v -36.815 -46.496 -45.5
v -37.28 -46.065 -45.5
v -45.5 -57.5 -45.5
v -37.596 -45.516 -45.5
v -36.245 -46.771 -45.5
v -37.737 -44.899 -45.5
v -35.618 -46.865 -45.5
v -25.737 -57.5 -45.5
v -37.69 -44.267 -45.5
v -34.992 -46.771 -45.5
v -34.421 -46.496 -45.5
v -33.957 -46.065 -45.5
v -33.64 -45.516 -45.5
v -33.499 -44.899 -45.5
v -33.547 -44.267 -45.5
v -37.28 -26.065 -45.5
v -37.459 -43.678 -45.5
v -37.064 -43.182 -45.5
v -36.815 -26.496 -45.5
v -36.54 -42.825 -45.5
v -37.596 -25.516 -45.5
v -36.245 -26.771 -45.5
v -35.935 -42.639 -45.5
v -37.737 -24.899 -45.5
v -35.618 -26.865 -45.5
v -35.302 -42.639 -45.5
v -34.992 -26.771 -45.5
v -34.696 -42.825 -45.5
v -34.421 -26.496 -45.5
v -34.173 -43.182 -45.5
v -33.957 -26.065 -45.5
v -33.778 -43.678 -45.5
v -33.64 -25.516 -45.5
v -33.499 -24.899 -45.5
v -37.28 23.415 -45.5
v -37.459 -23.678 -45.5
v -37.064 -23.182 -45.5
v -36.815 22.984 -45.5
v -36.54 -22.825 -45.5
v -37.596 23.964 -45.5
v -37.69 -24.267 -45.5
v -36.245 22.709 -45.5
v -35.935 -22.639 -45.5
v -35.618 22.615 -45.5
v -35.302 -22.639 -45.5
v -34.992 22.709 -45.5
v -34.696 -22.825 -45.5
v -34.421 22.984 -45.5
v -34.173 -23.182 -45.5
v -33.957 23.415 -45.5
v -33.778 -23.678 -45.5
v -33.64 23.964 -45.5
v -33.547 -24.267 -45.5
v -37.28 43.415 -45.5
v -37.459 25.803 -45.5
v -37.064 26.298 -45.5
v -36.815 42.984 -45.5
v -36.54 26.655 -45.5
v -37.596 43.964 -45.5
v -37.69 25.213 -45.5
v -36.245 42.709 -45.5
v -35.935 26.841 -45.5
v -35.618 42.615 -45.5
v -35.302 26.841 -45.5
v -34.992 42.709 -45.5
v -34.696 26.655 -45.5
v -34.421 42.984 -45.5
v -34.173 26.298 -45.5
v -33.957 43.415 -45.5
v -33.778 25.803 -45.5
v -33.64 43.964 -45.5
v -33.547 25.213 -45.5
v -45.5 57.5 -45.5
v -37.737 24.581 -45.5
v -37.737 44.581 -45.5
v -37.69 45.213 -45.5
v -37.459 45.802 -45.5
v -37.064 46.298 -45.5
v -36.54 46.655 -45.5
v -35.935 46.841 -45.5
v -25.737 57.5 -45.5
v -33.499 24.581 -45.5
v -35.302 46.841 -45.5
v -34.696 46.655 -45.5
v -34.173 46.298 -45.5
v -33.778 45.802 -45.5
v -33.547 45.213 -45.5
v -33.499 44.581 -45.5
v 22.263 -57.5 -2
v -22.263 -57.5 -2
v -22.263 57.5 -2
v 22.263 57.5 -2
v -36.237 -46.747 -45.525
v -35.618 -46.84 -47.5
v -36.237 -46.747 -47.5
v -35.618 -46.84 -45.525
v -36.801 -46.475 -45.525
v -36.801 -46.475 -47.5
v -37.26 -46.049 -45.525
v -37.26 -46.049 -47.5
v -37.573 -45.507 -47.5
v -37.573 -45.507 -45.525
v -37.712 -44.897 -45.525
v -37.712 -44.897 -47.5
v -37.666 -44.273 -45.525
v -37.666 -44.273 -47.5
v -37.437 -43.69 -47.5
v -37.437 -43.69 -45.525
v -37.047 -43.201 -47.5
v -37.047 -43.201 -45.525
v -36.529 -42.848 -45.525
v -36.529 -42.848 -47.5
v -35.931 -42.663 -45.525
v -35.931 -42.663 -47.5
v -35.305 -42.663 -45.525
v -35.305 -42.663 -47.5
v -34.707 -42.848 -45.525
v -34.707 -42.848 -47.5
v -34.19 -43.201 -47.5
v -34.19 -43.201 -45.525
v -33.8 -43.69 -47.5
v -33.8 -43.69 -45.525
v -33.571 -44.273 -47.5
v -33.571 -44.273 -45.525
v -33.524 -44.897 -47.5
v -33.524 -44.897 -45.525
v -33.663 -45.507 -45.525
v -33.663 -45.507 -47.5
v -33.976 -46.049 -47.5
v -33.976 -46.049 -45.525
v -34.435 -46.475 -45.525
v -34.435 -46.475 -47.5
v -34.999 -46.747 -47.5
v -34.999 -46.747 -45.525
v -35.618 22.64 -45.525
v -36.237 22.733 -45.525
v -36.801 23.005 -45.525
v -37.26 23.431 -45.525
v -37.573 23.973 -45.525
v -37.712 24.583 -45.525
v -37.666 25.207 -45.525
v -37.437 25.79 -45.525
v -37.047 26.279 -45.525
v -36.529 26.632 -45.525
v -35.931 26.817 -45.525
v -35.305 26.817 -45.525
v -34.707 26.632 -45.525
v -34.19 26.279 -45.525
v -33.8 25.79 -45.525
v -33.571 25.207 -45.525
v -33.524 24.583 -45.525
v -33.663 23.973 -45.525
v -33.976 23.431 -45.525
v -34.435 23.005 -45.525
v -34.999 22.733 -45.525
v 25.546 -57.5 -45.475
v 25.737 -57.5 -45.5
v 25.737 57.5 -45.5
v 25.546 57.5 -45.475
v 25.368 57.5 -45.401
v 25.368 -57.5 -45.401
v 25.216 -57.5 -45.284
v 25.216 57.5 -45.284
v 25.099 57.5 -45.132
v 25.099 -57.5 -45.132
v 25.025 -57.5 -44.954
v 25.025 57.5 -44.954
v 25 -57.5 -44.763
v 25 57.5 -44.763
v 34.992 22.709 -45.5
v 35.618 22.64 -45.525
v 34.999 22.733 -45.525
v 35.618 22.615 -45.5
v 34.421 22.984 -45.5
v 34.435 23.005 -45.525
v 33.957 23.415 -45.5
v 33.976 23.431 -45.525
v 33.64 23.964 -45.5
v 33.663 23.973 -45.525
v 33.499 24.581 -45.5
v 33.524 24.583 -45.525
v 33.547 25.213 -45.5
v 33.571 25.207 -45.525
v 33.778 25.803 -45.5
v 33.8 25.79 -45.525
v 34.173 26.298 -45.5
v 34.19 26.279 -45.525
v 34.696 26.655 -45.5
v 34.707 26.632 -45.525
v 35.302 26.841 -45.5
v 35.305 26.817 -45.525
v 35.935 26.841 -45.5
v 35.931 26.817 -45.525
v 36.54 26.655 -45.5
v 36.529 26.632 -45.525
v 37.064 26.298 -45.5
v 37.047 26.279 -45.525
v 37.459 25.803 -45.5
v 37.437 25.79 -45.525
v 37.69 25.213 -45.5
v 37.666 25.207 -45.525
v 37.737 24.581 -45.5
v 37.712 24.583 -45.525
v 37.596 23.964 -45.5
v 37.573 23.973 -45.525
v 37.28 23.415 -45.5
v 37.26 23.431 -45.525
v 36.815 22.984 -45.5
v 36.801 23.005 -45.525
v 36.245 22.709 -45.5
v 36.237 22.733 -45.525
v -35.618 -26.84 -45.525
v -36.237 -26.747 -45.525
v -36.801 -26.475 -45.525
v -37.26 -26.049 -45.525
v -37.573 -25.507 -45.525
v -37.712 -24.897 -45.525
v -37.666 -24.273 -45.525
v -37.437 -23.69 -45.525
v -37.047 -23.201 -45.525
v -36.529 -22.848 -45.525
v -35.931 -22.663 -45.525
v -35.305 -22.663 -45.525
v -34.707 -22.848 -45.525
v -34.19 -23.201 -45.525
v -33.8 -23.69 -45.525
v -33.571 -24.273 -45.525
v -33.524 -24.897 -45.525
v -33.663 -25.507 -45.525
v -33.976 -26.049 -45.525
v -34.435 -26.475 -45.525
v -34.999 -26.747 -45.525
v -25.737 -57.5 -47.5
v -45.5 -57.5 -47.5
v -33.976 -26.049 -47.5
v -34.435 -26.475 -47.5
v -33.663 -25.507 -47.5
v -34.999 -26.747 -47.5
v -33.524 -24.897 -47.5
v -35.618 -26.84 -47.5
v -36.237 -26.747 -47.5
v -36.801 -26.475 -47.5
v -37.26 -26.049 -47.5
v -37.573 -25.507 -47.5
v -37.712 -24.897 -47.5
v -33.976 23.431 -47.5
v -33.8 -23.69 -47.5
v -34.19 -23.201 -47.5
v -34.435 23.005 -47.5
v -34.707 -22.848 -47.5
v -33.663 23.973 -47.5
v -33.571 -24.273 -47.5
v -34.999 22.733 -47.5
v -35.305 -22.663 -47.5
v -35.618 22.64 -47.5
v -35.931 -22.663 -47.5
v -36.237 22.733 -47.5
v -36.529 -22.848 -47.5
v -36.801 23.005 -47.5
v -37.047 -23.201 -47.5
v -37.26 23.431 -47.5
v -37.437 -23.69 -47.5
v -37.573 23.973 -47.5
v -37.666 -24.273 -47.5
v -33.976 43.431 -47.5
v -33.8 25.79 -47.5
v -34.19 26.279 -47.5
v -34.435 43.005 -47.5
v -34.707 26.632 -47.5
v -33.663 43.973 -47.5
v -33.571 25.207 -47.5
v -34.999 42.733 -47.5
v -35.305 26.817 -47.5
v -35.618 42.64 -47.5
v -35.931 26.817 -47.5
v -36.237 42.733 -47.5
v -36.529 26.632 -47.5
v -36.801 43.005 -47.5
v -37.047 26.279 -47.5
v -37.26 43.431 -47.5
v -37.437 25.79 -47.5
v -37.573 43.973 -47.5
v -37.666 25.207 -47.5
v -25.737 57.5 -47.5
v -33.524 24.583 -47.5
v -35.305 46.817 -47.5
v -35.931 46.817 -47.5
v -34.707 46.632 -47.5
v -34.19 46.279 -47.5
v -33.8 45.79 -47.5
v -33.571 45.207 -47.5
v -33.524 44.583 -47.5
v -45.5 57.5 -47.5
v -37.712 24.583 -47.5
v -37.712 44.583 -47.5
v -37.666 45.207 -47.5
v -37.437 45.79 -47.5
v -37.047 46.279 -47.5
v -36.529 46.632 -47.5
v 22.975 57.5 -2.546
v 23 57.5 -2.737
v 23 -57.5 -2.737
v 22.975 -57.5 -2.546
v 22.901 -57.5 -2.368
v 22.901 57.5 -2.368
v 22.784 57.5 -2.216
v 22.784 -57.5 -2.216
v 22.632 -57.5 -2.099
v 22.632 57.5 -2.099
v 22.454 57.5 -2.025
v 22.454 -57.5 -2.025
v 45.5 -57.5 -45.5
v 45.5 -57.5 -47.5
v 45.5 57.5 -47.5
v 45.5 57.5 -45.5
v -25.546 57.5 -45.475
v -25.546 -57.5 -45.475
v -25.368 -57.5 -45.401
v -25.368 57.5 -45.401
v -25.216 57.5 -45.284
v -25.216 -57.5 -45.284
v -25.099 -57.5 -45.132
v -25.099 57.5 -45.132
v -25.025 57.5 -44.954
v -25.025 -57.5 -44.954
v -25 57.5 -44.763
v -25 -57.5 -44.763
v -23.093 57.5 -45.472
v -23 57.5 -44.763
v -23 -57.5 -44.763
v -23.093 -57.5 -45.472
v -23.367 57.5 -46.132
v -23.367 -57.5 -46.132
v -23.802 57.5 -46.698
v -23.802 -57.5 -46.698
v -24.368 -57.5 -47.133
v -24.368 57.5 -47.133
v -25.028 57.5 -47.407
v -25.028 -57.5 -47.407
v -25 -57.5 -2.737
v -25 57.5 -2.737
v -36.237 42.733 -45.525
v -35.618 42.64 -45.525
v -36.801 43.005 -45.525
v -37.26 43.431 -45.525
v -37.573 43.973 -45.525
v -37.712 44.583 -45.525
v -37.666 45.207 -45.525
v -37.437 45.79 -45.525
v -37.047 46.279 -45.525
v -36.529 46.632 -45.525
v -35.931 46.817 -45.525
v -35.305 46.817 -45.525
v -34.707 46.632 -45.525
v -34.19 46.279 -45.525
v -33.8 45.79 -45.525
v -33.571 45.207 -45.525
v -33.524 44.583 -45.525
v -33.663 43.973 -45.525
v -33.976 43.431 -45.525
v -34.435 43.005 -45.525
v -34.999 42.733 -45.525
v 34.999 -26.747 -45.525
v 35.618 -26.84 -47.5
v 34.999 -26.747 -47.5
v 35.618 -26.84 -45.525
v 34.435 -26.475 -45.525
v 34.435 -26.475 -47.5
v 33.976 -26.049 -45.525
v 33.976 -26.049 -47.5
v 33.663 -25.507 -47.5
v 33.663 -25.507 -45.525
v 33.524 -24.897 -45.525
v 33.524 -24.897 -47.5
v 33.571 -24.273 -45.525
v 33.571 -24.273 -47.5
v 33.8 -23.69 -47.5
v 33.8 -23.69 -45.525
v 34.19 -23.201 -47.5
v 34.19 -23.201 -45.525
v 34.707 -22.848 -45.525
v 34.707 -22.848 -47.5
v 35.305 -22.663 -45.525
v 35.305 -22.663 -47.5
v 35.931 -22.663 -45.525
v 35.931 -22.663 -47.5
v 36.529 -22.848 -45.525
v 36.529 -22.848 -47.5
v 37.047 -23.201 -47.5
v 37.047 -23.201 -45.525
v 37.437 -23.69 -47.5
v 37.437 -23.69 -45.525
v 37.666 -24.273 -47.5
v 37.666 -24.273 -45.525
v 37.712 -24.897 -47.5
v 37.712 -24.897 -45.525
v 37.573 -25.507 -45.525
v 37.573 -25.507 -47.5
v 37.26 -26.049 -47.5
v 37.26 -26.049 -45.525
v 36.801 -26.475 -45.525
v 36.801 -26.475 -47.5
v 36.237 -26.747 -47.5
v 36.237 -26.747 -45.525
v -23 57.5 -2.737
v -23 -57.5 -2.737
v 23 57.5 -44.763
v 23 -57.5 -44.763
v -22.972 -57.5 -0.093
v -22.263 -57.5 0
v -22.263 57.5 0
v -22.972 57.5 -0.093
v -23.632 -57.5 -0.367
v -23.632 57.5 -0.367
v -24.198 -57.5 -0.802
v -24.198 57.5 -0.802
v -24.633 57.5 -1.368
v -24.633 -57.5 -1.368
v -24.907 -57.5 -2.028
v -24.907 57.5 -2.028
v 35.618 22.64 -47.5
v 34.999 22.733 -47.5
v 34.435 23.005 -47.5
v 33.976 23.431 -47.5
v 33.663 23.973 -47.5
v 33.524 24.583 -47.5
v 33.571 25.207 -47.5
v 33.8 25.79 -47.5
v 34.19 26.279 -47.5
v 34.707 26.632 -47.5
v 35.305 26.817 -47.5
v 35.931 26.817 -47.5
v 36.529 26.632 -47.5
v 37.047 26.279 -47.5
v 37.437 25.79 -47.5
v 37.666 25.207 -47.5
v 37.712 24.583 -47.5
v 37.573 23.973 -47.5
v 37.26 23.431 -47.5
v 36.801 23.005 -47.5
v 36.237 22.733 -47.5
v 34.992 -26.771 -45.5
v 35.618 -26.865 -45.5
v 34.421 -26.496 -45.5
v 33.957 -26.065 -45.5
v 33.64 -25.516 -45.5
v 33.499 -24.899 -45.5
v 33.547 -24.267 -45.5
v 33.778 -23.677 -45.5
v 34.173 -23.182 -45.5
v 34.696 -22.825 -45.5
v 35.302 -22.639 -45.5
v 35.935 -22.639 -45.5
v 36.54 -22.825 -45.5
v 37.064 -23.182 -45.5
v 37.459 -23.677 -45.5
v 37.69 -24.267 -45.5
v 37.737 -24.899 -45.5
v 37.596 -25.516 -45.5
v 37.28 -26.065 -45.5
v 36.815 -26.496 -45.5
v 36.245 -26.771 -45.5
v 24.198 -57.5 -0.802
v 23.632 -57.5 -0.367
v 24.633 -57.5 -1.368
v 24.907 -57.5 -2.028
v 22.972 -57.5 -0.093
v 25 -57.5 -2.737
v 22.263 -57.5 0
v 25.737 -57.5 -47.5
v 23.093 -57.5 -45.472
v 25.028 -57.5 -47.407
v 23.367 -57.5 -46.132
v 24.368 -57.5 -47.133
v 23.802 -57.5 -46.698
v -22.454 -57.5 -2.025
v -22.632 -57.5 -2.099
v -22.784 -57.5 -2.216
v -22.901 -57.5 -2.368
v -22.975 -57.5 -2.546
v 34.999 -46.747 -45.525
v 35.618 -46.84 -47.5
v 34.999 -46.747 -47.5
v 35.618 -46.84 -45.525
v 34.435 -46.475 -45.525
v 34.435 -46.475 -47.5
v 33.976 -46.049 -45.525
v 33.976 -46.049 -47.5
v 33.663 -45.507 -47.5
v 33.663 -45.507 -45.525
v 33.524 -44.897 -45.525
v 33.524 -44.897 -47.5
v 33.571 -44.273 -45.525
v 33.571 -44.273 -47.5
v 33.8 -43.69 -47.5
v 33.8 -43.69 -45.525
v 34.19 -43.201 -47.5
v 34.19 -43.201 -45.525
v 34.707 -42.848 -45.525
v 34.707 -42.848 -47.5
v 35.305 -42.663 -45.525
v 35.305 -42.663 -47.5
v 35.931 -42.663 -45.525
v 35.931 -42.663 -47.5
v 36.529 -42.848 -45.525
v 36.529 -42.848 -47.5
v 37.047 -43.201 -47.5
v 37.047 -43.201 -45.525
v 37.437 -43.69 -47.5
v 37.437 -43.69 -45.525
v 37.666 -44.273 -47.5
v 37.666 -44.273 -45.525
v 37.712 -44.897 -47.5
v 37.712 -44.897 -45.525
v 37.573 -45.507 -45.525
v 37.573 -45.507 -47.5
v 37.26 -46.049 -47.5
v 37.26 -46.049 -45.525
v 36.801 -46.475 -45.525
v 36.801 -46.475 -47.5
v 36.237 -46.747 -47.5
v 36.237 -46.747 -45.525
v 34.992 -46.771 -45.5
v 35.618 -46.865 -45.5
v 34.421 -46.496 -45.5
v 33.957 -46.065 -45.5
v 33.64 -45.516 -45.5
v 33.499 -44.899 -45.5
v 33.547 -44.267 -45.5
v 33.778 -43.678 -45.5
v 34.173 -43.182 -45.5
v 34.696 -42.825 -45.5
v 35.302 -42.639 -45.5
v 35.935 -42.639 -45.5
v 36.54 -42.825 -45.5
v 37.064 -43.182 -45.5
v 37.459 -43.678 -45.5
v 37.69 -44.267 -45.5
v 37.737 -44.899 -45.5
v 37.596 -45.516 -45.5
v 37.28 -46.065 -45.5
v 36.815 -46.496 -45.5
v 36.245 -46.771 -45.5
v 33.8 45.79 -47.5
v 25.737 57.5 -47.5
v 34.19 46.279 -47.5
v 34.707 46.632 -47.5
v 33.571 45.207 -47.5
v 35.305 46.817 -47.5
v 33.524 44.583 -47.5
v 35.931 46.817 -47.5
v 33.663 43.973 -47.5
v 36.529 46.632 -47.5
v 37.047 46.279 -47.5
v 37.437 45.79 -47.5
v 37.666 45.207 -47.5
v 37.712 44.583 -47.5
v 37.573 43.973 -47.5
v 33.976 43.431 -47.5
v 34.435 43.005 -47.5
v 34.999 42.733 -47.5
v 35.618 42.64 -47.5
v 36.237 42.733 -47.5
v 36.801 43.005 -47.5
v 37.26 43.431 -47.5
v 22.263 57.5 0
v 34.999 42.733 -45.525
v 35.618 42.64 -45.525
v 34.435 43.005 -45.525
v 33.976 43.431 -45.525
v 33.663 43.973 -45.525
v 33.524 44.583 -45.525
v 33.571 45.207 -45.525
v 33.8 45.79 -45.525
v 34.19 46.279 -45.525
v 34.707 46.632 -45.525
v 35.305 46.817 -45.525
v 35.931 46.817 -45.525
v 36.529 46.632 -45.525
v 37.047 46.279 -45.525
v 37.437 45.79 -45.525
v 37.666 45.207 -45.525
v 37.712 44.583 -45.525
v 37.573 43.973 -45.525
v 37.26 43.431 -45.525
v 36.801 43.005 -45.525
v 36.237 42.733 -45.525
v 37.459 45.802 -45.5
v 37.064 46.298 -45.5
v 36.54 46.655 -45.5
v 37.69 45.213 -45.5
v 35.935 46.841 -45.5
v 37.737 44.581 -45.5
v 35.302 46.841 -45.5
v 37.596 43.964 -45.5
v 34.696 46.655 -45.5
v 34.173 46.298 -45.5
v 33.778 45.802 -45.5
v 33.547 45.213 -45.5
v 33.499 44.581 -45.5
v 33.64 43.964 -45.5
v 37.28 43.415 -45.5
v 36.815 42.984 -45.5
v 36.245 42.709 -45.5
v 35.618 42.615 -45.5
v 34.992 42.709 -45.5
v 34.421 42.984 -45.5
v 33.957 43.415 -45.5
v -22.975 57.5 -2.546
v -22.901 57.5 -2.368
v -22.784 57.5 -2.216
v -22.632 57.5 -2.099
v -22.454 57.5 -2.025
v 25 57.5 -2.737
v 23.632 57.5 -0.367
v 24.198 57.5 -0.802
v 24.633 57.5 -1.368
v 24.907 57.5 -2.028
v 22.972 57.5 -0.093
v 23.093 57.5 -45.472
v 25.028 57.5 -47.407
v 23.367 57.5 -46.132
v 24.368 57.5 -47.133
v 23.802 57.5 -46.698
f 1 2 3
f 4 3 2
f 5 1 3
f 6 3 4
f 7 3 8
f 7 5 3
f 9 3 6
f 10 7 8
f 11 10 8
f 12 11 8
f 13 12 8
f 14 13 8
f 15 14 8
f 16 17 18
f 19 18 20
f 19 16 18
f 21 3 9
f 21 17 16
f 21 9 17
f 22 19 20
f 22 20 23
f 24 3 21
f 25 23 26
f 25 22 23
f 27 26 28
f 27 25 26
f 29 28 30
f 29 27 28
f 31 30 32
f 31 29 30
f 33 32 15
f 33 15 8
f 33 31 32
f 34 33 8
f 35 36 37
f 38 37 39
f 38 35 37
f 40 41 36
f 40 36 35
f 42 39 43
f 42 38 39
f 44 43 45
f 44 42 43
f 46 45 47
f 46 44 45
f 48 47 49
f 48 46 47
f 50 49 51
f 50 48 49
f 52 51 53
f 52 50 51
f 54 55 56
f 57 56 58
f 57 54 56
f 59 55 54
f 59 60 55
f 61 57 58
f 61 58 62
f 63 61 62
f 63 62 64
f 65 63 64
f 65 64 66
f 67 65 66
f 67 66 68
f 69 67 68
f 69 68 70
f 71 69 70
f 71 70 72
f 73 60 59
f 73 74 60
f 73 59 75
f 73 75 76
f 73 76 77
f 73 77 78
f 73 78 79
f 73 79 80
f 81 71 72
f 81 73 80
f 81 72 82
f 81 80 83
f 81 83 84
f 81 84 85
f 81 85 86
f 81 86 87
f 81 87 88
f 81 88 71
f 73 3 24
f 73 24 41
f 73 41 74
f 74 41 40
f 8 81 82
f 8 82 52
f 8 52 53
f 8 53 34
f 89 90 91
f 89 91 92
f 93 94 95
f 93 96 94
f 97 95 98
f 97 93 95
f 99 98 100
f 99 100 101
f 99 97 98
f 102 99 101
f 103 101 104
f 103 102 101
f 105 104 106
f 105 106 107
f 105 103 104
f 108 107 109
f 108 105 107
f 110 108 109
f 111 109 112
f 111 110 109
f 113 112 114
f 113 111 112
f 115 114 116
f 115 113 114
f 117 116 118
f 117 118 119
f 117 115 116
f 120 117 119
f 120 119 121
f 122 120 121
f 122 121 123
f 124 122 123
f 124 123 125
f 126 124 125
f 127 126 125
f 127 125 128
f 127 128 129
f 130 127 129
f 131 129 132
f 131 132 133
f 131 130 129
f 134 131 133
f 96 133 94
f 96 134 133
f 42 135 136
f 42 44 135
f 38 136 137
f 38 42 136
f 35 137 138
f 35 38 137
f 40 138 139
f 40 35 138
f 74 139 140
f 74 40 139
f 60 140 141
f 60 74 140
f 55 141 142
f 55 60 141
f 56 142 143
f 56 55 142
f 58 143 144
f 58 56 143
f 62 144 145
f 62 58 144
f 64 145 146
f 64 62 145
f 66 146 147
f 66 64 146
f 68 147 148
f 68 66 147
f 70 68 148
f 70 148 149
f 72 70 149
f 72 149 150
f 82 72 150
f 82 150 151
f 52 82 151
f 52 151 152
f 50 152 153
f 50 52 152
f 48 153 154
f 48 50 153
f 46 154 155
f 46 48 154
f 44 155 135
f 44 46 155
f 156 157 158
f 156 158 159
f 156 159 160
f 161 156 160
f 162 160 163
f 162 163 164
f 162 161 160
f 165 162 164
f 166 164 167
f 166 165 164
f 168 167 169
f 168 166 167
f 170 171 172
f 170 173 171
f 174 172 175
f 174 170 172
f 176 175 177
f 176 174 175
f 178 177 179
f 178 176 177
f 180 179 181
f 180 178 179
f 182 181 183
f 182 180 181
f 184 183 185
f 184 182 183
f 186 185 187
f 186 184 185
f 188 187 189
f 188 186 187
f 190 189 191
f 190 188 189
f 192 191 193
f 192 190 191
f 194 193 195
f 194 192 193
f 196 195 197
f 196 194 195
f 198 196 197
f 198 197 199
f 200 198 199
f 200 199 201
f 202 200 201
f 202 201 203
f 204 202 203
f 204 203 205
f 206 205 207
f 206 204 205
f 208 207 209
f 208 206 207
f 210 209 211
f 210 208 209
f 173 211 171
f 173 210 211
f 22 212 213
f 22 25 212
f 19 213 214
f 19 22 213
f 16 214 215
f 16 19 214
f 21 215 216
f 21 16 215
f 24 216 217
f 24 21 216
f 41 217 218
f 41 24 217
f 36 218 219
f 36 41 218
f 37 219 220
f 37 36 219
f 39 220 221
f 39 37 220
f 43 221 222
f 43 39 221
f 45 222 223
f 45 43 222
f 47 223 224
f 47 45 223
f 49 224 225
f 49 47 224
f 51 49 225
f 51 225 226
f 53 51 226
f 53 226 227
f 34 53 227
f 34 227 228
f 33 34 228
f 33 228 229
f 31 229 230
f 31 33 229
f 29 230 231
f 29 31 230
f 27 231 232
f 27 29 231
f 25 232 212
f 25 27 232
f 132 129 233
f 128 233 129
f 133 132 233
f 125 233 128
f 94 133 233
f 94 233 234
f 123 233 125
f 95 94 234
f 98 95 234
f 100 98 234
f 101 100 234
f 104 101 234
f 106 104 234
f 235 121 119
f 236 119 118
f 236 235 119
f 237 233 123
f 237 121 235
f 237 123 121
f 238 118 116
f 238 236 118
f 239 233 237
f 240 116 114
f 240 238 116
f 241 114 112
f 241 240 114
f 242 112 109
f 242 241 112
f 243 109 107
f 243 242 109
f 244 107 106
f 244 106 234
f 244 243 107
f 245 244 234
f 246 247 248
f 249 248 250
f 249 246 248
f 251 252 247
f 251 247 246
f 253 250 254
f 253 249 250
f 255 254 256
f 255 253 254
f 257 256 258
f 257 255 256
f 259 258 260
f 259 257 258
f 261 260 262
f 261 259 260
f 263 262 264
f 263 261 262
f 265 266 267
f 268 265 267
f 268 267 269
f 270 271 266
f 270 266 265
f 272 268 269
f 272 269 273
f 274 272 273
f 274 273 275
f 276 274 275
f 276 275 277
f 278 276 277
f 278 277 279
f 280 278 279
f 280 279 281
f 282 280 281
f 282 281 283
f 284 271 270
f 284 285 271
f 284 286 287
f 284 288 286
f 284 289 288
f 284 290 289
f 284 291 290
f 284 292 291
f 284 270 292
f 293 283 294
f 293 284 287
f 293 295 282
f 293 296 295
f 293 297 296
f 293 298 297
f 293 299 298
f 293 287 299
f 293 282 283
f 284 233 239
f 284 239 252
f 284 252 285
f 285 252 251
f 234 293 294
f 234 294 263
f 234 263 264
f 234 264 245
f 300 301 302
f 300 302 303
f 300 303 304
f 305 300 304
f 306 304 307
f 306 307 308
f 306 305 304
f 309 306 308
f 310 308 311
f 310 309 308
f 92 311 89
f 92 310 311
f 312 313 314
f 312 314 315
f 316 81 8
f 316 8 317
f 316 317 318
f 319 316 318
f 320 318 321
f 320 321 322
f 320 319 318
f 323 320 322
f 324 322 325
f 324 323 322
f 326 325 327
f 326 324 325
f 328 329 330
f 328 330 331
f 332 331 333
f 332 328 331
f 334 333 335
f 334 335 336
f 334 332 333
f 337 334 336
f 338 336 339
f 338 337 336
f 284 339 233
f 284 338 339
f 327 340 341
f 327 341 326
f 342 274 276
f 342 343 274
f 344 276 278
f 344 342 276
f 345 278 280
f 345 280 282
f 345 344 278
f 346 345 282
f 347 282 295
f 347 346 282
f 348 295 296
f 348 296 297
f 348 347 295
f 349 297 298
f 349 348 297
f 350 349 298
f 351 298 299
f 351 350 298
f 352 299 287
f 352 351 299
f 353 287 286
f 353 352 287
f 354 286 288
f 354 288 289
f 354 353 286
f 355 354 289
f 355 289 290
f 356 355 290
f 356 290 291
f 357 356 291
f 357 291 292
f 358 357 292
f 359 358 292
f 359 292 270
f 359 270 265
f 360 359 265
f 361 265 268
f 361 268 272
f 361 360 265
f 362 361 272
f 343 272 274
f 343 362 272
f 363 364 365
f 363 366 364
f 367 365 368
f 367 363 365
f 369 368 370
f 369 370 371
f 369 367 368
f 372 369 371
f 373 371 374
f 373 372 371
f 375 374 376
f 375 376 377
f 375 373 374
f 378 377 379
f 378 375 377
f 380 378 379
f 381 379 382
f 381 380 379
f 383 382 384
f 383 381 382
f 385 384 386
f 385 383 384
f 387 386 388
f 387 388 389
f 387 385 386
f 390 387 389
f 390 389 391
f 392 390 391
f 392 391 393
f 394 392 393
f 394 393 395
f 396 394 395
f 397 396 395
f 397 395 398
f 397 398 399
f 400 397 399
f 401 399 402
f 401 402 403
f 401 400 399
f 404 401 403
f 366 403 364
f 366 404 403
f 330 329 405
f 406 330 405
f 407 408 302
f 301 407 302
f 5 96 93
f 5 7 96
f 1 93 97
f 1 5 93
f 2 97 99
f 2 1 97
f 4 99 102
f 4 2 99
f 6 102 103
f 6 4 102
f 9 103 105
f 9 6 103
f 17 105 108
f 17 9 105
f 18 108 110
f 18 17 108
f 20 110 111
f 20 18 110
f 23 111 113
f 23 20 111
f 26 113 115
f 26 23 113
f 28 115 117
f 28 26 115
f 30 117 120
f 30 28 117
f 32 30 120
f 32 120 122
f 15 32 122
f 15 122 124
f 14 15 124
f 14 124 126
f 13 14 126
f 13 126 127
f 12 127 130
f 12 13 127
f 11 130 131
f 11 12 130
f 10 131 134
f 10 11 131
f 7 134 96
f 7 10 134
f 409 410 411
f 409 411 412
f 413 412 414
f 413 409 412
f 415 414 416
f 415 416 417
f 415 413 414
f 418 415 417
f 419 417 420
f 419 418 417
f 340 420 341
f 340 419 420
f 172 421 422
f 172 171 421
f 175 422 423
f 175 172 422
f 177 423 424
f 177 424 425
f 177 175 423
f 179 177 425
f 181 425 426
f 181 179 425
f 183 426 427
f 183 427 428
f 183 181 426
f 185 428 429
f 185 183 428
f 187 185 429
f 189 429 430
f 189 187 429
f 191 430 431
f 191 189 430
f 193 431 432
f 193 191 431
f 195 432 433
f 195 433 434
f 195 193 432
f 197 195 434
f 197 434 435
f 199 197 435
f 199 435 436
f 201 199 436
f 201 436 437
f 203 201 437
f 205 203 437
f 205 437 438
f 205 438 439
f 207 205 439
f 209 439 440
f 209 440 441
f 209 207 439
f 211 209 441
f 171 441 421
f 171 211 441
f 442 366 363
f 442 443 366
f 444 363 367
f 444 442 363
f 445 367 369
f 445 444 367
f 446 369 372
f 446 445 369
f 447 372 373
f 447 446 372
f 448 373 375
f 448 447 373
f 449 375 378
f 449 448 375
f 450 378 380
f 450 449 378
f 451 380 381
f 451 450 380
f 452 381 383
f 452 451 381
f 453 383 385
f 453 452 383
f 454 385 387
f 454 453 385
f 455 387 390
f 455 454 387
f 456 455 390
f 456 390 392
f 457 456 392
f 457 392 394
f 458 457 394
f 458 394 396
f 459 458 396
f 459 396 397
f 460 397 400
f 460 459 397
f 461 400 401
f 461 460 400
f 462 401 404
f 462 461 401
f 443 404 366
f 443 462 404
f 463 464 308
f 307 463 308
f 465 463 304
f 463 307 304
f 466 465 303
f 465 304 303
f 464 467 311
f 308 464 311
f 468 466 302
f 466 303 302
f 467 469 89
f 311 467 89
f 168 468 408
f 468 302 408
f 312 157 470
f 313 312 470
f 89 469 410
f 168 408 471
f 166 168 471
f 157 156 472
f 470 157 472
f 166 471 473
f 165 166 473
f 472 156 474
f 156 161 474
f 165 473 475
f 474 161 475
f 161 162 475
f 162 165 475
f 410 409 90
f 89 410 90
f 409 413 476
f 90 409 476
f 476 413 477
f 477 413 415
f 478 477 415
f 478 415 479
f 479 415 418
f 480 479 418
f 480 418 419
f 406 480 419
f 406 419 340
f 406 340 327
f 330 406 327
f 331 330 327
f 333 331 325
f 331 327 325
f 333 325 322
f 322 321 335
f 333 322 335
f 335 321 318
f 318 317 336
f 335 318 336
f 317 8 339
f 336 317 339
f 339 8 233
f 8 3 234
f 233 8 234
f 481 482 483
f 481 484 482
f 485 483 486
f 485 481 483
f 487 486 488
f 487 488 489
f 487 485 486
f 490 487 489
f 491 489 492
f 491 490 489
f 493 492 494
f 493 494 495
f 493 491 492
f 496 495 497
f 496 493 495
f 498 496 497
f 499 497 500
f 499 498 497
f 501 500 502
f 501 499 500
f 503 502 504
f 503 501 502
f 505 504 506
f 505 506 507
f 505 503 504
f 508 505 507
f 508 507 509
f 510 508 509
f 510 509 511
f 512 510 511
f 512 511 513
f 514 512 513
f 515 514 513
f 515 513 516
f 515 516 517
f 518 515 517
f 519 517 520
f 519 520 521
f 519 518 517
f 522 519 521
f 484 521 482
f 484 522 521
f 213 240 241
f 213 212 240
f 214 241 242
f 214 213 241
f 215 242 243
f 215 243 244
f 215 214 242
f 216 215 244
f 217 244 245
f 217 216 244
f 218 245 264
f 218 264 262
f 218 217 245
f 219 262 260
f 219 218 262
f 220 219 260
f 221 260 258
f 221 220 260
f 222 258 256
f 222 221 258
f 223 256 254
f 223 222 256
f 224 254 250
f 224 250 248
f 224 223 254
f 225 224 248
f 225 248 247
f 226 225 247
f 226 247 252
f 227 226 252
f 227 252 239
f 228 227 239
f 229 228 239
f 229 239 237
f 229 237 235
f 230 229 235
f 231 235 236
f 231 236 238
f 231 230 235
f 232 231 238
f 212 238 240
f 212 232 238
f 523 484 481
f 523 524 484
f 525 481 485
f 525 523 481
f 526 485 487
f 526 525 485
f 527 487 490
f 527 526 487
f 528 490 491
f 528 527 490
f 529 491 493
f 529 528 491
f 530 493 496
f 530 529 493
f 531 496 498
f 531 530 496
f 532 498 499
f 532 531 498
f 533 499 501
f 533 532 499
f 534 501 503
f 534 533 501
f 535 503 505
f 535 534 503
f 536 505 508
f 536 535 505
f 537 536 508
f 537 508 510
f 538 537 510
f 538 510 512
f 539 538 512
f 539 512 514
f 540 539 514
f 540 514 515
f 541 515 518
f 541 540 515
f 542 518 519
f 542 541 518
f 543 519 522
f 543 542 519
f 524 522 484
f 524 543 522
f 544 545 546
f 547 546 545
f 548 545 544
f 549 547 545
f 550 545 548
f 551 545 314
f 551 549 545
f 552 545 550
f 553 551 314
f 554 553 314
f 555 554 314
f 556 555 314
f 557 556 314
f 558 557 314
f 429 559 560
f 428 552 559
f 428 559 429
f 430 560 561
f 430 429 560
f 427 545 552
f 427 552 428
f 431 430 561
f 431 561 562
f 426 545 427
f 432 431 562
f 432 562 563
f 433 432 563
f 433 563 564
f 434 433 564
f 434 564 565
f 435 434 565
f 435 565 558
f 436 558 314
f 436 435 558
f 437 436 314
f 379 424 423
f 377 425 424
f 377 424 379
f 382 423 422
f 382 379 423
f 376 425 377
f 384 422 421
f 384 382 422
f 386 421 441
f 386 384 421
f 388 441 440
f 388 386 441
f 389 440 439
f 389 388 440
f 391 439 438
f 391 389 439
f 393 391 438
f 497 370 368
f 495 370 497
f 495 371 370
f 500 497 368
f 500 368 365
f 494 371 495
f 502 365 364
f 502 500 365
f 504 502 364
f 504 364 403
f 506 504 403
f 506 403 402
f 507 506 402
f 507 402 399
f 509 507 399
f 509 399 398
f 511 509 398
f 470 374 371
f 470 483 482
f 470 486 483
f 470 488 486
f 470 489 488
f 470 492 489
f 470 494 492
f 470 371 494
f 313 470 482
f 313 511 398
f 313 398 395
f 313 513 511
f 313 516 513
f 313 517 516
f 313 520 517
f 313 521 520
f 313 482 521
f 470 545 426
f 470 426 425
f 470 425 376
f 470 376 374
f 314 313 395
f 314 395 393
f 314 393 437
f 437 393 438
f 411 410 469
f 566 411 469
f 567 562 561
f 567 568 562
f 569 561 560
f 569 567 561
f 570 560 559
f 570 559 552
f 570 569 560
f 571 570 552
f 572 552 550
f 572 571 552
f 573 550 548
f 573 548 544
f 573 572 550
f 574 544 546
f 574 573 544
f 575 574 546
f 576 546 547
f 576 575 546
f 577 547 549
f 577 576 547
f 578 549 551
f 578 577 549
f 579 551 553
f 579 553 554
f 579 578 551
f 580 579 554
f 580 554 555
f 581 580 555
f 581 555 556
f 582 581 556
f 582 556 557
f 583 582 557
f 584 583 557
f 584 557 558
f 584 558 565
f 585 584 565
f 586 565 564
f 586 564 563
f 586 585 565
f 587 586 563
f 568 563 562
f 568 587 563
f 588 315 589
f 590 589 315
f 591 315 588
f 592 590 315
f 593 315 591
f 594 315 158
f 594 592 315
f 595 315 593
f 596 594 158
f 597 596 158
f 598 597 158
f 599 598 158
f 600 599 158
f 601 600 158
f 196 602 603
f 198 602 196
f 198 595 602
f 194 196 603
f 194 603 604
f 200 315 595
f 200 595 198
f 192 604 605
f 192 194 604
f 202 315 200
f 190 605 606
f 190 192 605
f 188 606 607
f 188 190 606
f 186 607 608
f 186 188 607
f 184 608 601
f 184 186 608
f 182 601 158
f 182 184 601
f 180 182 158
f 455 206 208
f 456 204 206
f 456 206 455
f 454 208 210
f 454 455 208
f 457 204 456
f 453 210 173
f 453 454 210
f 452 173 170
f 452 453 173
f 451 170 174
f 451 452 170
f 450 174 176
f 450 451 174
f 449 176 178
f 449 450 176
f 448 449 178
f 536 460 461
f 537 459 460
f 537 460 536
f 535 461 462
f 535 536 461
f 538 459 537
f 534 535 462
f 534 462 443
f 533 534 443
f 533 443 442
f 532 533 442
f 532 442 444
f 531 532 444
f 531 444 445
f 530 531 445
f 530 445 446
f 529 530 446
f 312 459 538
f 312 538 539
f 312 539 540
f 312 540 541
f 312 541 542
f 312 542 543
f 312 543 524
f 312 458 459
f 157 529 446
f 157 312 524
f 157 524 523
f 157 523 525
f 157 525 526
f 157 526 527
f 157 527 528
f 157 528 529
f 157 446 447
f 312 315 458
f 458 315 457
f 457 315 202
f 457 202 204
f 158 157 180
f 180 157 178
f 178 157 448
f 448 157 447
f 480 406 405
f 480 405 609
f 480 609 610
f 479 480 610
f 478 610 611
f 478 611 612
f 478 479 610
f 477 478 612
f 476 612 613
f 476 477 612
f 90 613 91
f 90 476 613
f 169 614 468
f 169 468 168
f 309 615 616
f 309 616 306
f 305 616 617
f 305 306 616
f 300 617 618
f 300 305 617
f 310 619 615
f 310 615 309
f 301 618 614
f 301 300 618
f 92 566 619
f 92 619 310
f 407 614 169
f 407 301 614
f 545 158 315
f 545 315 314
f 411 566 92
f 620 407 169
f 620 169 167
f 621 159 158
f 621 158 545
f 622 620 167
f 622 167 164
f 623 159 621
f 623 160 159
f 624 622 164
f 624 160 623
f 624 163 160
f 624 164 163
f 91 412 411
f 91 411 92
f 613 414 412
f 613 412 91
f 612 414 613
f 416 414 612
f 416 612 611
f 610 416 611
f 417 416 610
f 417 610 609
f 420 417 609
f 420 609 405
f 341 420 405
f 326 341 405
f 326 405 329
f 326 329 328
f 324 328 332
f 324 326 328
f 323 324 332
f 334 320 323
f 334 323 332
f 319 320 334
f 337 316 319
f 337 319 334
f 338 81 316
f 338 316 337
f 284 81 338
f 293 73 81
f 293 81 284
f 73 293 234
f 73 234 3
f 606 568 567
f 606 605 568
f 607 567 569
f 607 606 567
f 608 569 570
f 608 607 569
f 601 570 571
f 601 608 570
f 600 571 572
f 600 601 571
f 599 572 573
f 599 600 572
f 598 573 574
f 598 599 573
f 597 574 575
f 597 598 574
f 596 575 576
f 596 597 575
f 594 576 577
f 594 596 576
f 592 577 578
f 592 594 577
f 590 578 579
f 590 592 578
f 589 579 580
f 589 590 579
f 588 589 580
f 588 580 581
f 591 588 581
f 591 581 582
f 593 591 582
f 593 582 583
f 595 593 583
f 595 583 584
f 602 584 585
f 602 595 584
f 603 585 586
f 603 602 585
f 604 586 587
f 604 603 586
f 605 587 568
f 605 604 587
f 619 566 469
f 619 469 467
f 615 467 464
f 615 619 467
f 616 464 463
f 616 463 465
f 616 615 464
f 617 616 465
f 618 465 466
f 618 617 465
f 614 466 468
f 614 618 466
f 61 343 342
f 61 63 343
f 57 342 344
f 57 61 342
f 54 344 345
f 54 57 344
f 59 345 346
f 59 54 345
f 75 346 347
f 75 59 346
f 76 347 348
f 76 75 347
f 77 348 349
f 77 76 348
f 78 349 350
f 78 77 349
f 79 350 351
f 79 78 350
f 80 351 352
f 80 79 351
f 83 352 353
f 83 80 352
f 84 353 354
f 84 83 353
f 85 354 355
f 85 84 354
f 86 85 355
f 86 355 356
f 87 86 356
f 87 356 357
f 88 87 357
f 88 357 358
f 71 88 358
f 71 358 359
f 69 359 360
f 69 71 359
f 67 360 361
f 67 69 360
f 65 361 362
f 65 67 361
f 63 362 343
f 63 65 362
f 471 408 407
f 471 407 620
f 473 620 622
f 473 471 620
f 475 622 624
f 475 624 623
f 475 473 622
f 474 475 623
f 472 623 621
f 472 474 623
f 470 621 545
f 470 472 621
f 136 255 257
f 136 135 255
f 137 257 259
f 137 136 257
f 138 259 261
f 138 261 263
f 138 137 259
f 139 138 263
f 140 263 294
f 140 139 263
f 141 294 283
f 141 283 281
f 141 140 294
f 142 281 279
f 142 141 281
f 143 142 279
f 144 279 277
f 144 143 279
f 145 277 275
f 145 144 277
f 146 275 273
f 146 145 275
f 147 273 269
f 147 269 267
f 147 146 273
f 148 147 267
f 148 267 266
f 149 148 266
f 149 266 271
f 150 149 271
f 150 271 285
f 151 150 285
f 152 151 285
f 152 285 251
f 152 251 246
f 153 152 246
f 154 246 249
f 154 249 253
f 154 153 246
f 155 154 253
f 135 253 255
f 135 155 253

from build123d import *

# Parameters (mm, degrees)
SKETCH1_W                        = 45
SKETCH1_H                        = 115
BASE_FLANGE1_DEPTH               = 2
EDGE_FLANGE1_STRIP_W             = 9.9732
EDGE_FLANGE1_STRIP_H             = 2
EDGE_FLANGE1_STRIP_CUT_DEPTH     = 115
EDGE_FLANGE1_DEPTH               = 115
EDGE_FLANGE2_STRIP_W             = 9.9732
EDGE_FLANGE2_STRIP_H             = 2
EDGE_FLANGE2_STRIP_CUT_DEPTH     = 115
EDGE_FLANGE2_DEPTH               = 115
EDGE_FLANGE3_STRIP_W             = 9.9732
EDGE_FLANGE3_STRIP_H             = 2
EDGE_FLANGE3_STRIP_CUT_DEPTH     = 115
EDGE_FLANGE3_DEPTH               = 115
EDGE_FLANGE4_STRIP_W             = 9.9732
EDGE_FLANGE4_STRIP_H             = 2
EDGE_FLANGE4_STRIP_CUT_DEPTH     = 115
EDGE_FLANGE4_DEPTH               = 115
TAP_DRILL_FOR_M5_TAP1_AT_2_COUNT = 2
TAP_DRILL_FOR_M5_TAP1_AT_2_PITCH = 20
TAP_DRILL_FOR_M5_TAP1_AT_3_COUNT = 2
TAP_DRILL_FOR_M5_TAP1_AT_3_PITCH = 69.48
TAP_DRILL_FOR_M5_TAP1_AT_4_COUNT = 2
TAP_DRILL_FOR_M5_TAP1_AT_4_PITCH = 89.48
TAP_DRILL_FOR_M5_TAP1_AT_5_COUNT = 2
TAP_DRILL_FOR_M5_TAP1_AT_5_PITCH = 114.373614001
TAP_DRILL_FOR_M5_TAP1_AT_6_COUNT = 2
TAP_DRILL_FOR_M5_TAP1_AT_6_PITCH = 99.509414527
TAP_DRILL_FOR_M5_TAP1_AT_7_COUNT = 2
TAP_DRILL_FOR_M5_TAP1_AT_7_PITCH = 73.990899302
TAP_DRILL_FOR_M5_TAP1_AT_8_COUNT = 2
TAP_DRILL_FOR_M5_TAP1_AT_8_PITCH = 71.2366


# Sheet-metal steps are written as plain solids
with BuildPart() as part:
    # Sketch1 → Base-Flange1 (new body)
    with BuildSketch(Plane.XY):
        Rectangle(SKETCH1_W, SKETCH1_H)
    extrude(amount=-BASE_FLANGE1_DEPTH)

    # Edge-Flange1 strip (across the edge) → Edge-Flange1 strip cut (cut)
    with BuildSketch(Plane(origin=(23, 57.5, -2), x_dir=(-1, 0, 0), z_dir=(0, -1, 0))):
        with Locations((-4.25, -1)):
            Rectangle(EDGE_FLANGE1_STRIP_W, EDGE_FLANGE1_STRIP_H)
    extrude(amount=EDGE_FLANGE1_STRIP_CUT_DEPTH, mode=Mode.SUBTRACT)

    # Edge-Flange1 section (across the edge) → Edge-Flange1 (add)
    with BuildSketch(Plane(origin=(23, 57.5, -2), x_dir=(-1, 0, 0), z_dir=(0, -1, 0))):
        with BuildLine():
            Line((-2, 0.7366), (-2, 43))
            Line((-2, 43), (0, 43))
            Line((0, 43), (0, 0.7366))
            ThreePointArc((0, 0.7366), (0.215745145, 0.215745145), (0.7366, 0))
            Line((0.7366, 0), (0.7366, -2))
            ThreePointArc((0.7366, -2), (-1.198468417, -1.198468417), (-2, 0.7366))
        make_face()
    extrude(amount=EDGE_FLANGE1_DEPTH)

    # Edge-Flange2 strip (across the edge) → Edge-Flange2 strip cut (cut)
    with BuildSketch(Plane(origin=(25, -57.5, -45.5), x_dir=(0, 0, 1), z_dir=(0, 1, 0))):
        with Locations((-4.25, -1)):
            Rectangle(EDGE_FLANGE2_STRIP_W, EDGE_FLANGE2_STRIP_H)
    extrude(amount=EDGE_FLANGE2_STRIP_CUT_DEPTH, mode=Mode.SUBTRACT)

    # Edge-Flange2 section (across the edge) → Edge-Flange2 (add)
    with BuildSketch(Plane(origin=(25, -57.5, -45.5), x_dir=(0, 0, 1), z_dir=(0, 1, 0))):
        with BuildLine():
            Line((-2, 0.7366), (-2, 20.5))
            Line((-2, 20.5), (0, 20.5))
            Line((0, 20.5), (0, 0.7366))
            ThreePointArc((0, 0.7366), (0.215745145, 0.215745145), (0.7366, 0))
            Line((0.7366, 0), (0.7366, -2))
            ThreePointArc((0.7366, -2), (-1.198468417, -1.198468417), (-2, 0.7366))
        make_face()
    extrude(amount=EDGE_FLANGE2_DEPTH)

    # Edge-Flange3 strip (across the edge) → Edge-Flange3 strip cut (cut)
    with BuildSketch(Plane(origin=(-23, -57.5, -2), x_dir=(1, 0, 0), z_dir=(0, 1, 0))):
        with Locations((-4.25, -1)):
            Rectangle(EDGE_FLANGE3_STRIP_W, EDGE_FLANGE3_STRIP_H)
    extrude(amount=EDGE_FLANGE3_STRIP_CUT_DEPTH, mode=Mode.SUBTRACT)

    # Edge-Flange3 section (across the edge) → Edge-Flange3 (add)
    with BuildSketch(Plane(origin=(-23, -57.5, -2), x_dir=(1, 0, 0), z_dir=(0, 1, 0))):
        with BuildLine():
            Line((-2, 0.7366), (-2, 43))
            Line((-2, 43), (0, 43))
            Line((0, 43), (0, 0.7366))
            ThreePointArc((0, 0.7366), (0.215745145, 0.215745145), (0.7366, 0))
            Line((0.7366, 0), (0.7366, -2))
            ThreePointArc((0.7366, -2), (-1.198468417, -1.198468417), (-2, 0.7366))
        make_face()
    extrude(amount=EDGE_FLANGE3_DEPTH)

    # Edge-Flange4 strip (across the edge) → Edge-Flange4 strip cut (cut)
    with BuildSketch(Plane(origin=(-25, 57.5, -45.5), x_dir=(0, 0, 1), z_dir=(0, -1, 0))):
        with Locations((-4.25, -1)):
            Rectangle(EDGE_FLANGE4_STRIP_W, EDGE_FLANGE4_STRIP_H)
    extrude(amount=EDGE_FLANGE4_STRIP_CUT_DEPTH, mode=Mode.SUBTRACT)

    # Edge-Flange4 section (across the edge) → Edge-Flange4 (add)
    with BuildSketch(Plane(origin=(-25, 57.5, -45.5), x_dir=(0, 0, 1), z_dir=(0, -1, 0))):
        with BuildLine():
            Line((-2, 0.7366), (-2, 20.5))
            Line((-2, 20.5), (0, 20.5))
            Line((0, 20.5), (0, 0.7366))
            ThreePointArc((0, 0.7366), (0.215745145, 0.215745145), (0.7366, 0))
            Line((0.7366, 0), (0.7366, -2))
            ThreePointArc((0.7366, -2), (-1.198468417, -1.198468417), (-2, 0.7366))
        make_face()
    extrude(amount=EDGE_FLANGE4_DEPTH)

    # Sketch21 → Tap Drill for M5 Tap1 (revolve, cut)
    with BuildSketch(Plane(origin=(-35.6183, 44.74, -45.5), x_dir=(0, -1, 0), z_dir=(1, 0, 0))):
        Polygon((0, 0), (0, 2), (2.1, 2), (2.1, 0.025), (2.125, 0), align=None)
    tap_drill_for_m5_tap1 = revolve(axis=Axis((-35.6183, 44.74, -39.15), (0, 0, -1)), mode=Mode.SUBTRACT)

    # Tap Drill for M5 Tap1 at 2: Tap Drill for M5 Tap1 ×2
    with Locations(*[(0, -i * TAP_DRILL_FOR_M5_TAP1_AT_2_PITCH, 0) for i in range(1, TAP_DRILL_FOR_M5_TAP1_AT_2_COUNT)]):
        add(tap_drill_for_m5_tap1, mode=Mode.SUBTRACT)

    # Tap Drill for M5 Tap1 at 3: Tap Drill for M5 Tap1 ×2
    with Locations(*[(0, -i * TAP_DRILL_FOR_M5_TAP1_AT_3_PITCH, 0) for i in range(1, TAP_DRILL_FOR_M5_TAP1_AT_3_COUNT)]):
        add(tap_drill_for_m5_tap1, mode=Mode.SUBTRACT)

    # Tap Drill for M5 Tap1 at 4: Tap Drill for M5 Tap1 ×2
    with Locations(*[(0, -i * TAP_DRILL_FOR_M5_TAP1_AT_4_PITCH, 0) for i in range(1, TAP_DRILL_FOR_M5_TAP1_AT_4_COUNT)]):
        add(tap_drill_for_m5_tap1, mode=Mode.SUBTRACT)

    # Tap Drill for M5 Tap1 at 5: Tap Drill for M5 Tap1 ×2
    with Locations(*[Vector(0.622841208809067, -0.7823482783321378, 0) * (i * TAP_DRILL_FOR_M5_TAP1_AT_5_PITCH) for i in range(1, TAP_DRILL_FOR_M5_TAP1_AT_5_COUNT)]):
        add(tap_drill_for_m5_tap1, mode=Mode.SUBTRACT)

    # Tap Drill for M5 Tap1 at 6: Tap Drill for M5 Tap1 ×2
    with Locations(*[Vector(0.7158779934382821, -0.6982253923417416, 0) * (i * TAP_DRILL_FOR_M5_TAP1_AT_6_PITCH) for i in range(1, TAP_DRILL_FOR_M5_TAP1_AT_6_COUNT)]):
        add(tap_drill_for_m5_tap1, mode=Mode.SUBTRACT)

    # Tap Drill for M5 Tap1 at 7: Tap Drill for M5 Tap1 ×2
    with Locations(*[Vector(0.9627751611583101, -0.27030351284544973, 0) * (i * TAP_DRILL_FOR_M5_TAP1_AT_7_PITCH) for i in range(1, TAP_DRILL_FOR_M5_TAP1_AT_7_COUNT)]):
        add(tap_drill_for_m5_tap1, mode=Mode.SUBTRACT)

    # Tap Drill for M5 Tap1 at 8: Tap Drill for M5 Tap1 ×2
    with Locations(*[(i * TAP_DRILL_FOR_M5_TAP1_AT_8_PITCH, 0, 0) for i in range(1, TAP_DRILL_FOR_M5_TAP1_AT_8_COUNT)]):
        add(tap_drill_for_m5_tap1, mode=Mode.SUBTRACT)


solid = part.part
